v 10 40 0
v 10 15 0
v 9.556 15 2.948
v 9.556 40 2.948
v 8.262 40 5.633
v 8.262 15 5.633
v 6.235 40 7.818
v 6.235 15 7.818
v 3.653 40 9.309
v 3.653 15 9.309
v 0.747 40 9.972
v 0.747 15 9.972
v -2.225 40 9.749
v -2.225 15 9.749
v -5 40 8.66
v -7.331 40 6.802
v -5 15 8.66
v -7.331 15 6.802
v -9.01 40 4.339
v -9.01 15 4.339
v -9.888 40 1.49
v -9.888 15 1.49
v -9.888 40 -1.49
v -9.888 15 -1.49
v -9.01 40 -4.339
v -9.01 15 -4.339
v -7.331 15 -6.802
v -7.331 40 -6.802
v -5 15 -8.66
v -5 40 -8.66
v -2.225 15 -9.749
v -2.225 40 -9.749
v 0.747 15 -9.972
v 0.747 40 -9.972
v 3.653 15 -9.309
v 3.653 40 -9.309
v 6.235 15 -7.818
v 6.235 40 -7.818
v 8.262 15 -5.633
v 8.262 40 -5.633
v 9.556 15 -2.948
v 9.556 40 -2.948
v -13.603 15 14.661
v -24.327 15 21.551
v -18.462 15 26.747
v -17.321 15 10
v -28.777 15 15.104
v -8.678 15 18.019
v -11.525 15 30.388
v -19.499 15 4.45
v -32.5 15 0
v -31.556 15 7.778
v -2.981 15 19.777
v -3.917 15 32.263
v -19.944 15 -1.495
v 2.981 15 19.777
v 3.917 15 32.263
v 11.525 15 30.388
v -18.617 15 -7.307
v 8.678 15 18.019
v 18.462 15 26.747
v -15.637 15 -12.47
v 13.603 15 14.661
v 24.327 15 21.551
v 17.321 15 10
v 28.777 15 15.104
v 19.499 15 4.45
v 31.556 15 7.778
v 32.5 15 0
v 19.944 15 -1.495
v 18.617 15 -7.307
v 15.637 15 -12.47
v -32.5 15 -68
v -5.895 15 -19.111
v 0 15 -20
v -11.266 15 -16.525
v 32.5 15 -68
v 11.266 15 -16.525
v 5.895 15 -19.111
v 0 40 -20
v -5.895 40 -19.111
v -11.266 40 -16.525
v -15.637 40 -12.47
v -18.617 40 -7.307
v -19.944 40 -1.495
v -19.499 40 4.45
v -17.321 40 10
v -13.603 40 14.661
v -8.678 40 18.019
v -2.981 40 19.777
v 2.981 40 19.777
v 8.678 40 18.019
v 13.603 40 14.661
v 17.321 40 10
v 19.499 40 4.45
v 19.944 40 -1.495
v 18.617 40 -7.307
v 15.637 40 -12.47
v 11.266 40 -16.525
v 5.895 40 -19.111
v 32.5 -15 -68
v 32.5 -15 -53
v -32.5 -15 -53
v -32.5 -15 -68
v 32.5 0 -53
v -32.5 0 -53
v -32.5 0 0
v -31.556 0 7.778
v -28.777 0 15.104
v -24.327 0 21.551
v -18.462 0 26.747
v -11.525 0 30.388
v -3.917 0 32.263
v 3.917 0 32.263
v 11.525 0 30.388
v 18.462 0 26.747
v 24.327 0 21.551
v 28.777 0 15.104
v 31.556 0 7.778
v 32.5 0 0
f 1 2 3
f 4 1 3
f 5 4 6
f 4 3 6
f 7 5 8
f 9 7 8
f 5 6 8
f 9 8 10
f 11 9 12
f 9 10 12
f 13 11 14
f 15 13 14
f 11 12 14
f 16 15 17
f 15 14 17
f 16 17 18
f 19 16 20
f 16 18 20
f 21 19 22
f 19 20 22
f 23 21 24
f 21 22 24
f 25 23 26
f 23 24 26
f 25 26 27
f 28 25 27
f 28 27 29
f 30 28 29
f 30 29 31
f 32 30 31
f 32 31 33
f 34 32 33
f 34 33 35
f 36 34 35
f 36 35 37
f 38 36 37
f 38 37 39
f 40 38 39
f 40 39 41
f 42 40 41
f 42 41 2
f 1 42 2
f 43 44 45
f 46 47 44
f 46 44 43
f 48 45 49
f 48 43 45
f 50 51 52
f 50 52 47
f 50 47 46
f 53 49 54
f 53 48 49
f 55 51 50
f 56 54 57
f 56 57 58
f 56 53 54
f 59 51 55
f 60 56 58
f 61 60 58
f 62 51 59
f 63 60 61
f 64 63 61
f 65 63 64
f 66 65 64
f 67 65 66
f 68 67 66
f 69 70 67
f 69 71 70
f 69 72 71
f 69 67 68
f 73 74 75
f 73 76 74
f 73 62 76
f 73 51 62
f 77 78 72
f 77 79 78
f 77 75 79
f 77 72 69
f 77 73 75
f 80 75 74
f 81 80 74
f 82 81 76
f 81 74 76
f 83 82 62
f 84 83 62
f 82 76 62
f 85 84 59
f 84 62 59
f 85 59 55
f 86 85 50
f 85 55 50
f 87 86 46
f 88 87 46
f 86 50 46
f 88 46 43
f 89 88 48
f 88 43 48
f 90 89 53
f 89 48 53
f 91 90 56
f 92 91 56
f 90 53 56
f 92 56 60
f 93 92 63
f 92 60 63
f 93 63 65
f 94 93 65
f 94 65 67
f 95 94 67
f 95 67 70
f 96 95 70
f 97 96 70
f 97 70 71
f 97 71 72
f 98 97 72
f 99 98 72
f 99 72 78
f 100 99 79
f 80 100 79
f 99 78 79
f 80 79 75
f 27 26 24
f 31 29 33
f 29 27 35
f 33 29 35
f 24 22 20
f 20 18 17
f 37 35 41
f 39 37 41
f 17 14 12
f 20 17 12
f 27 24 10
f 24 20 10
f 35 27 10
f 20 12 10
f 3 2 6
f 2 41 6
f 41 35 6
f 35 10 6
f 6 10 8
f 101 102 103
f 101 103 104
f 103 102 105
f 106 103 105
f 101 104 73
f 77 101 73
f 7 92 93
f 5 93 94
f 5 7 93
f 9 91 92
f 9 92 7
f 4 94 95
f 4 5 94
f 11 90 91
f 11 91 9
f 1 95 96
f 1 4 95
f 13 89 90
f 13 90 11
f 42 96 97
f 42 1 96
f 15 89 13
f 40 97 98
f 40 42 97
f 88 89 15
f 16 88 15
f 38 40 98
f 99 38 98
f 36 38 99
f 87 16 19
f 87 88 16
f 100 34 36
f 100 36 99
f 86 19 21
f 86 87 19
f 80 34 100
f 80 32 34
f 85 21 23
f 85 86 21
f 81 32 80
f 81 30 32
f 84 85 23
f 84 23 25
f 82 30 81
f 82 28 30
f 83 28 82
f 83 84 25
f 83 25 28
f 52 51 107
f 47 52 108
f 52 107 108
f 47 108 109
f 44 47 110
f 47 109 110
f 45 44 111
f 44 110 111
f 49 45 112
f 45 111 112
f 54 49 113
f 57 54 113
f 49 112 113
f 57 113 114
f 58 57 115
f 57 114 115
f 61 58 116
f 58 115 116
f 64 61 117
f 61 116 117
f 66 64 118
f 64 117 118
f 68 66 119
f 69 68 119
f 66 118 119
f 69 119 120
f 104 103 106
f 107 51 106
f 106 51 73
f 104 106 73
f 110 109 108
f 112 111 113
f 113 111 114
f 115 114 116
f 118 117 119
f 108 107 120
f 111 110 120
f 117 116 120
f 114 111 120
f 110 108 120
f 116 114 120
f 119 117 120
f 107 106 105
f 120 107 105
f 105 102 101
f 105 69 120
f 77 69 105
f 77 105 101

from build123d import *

# Parameters (mm, degrees)
EXTRUDE_1_DEPTH     = 15
SKETCH2_W           = 15
SKETCH2_H           = 15
EXTRUDE_2_DEPTH     = 65
SKETCH3_R           = 20
EXTRUDE_3_DEPTH     = 25
HOLE_WIZARD_1_D     = 20
HOLE_WIZARD_1_DEPTH = 25


with BuildPart() as part:
    # Sketch1 → 填料-伸長1 (new body)
    with BuildSketch(Plane(origin=(0, 0, 0), x_dir=(1, 0, 0), z_dir=(0, 1, 0))):
        with BuildLine():
            Line((32.5, 0), (32.5, 68))
            Line((32.5, 68), (-32.5, 68))
            Line((-32.5, 68), (-32.5, 0))
            ThreePointArc((-32.5, 0), (0, -32.5), (32.5, 0))
        make_face()
    extrude(amount=EXTRUDE_1_DEPTH)

    # Sketch2 → 填料-伸長2 (add, through all)
    with BuildSketch(Plane(origin=(32.5, 0, 0), x_dir=(0, 0, -1), z_dir=(1, 0, 0))):
        with Locations((60.5, -7.5)):
            Rectangle(SKETCH2_W, SKETCH2_H)
    extrude(amount=-EXTRUDE_2_DEPTH)

    # Sketch3 → 填料-伸長3 (add)
    with BuildSketch(Plane(origin=(0, 15, 0), x_dir=(-1, 0, 0), z_dir=(0, 1, 0))):
        with Locations(Location((0, 0, 0), (0, 0, 270))):
            Circle(SKETCH3_R)
    extrude(amount=EXTRUDE_3_DEPTH)

    # 鑽孔1
    with Locations(Plane(origin=(0, 40, 0), x_dir=(-1, 0, 0), z_dir=(0, 1, 0))):
        with Locations((0, 0)):
            Hole(HOLE_WIZARD_1_D / 2, depth=HOLE_WIZARD_1_DEPTH)


solid = part.part
